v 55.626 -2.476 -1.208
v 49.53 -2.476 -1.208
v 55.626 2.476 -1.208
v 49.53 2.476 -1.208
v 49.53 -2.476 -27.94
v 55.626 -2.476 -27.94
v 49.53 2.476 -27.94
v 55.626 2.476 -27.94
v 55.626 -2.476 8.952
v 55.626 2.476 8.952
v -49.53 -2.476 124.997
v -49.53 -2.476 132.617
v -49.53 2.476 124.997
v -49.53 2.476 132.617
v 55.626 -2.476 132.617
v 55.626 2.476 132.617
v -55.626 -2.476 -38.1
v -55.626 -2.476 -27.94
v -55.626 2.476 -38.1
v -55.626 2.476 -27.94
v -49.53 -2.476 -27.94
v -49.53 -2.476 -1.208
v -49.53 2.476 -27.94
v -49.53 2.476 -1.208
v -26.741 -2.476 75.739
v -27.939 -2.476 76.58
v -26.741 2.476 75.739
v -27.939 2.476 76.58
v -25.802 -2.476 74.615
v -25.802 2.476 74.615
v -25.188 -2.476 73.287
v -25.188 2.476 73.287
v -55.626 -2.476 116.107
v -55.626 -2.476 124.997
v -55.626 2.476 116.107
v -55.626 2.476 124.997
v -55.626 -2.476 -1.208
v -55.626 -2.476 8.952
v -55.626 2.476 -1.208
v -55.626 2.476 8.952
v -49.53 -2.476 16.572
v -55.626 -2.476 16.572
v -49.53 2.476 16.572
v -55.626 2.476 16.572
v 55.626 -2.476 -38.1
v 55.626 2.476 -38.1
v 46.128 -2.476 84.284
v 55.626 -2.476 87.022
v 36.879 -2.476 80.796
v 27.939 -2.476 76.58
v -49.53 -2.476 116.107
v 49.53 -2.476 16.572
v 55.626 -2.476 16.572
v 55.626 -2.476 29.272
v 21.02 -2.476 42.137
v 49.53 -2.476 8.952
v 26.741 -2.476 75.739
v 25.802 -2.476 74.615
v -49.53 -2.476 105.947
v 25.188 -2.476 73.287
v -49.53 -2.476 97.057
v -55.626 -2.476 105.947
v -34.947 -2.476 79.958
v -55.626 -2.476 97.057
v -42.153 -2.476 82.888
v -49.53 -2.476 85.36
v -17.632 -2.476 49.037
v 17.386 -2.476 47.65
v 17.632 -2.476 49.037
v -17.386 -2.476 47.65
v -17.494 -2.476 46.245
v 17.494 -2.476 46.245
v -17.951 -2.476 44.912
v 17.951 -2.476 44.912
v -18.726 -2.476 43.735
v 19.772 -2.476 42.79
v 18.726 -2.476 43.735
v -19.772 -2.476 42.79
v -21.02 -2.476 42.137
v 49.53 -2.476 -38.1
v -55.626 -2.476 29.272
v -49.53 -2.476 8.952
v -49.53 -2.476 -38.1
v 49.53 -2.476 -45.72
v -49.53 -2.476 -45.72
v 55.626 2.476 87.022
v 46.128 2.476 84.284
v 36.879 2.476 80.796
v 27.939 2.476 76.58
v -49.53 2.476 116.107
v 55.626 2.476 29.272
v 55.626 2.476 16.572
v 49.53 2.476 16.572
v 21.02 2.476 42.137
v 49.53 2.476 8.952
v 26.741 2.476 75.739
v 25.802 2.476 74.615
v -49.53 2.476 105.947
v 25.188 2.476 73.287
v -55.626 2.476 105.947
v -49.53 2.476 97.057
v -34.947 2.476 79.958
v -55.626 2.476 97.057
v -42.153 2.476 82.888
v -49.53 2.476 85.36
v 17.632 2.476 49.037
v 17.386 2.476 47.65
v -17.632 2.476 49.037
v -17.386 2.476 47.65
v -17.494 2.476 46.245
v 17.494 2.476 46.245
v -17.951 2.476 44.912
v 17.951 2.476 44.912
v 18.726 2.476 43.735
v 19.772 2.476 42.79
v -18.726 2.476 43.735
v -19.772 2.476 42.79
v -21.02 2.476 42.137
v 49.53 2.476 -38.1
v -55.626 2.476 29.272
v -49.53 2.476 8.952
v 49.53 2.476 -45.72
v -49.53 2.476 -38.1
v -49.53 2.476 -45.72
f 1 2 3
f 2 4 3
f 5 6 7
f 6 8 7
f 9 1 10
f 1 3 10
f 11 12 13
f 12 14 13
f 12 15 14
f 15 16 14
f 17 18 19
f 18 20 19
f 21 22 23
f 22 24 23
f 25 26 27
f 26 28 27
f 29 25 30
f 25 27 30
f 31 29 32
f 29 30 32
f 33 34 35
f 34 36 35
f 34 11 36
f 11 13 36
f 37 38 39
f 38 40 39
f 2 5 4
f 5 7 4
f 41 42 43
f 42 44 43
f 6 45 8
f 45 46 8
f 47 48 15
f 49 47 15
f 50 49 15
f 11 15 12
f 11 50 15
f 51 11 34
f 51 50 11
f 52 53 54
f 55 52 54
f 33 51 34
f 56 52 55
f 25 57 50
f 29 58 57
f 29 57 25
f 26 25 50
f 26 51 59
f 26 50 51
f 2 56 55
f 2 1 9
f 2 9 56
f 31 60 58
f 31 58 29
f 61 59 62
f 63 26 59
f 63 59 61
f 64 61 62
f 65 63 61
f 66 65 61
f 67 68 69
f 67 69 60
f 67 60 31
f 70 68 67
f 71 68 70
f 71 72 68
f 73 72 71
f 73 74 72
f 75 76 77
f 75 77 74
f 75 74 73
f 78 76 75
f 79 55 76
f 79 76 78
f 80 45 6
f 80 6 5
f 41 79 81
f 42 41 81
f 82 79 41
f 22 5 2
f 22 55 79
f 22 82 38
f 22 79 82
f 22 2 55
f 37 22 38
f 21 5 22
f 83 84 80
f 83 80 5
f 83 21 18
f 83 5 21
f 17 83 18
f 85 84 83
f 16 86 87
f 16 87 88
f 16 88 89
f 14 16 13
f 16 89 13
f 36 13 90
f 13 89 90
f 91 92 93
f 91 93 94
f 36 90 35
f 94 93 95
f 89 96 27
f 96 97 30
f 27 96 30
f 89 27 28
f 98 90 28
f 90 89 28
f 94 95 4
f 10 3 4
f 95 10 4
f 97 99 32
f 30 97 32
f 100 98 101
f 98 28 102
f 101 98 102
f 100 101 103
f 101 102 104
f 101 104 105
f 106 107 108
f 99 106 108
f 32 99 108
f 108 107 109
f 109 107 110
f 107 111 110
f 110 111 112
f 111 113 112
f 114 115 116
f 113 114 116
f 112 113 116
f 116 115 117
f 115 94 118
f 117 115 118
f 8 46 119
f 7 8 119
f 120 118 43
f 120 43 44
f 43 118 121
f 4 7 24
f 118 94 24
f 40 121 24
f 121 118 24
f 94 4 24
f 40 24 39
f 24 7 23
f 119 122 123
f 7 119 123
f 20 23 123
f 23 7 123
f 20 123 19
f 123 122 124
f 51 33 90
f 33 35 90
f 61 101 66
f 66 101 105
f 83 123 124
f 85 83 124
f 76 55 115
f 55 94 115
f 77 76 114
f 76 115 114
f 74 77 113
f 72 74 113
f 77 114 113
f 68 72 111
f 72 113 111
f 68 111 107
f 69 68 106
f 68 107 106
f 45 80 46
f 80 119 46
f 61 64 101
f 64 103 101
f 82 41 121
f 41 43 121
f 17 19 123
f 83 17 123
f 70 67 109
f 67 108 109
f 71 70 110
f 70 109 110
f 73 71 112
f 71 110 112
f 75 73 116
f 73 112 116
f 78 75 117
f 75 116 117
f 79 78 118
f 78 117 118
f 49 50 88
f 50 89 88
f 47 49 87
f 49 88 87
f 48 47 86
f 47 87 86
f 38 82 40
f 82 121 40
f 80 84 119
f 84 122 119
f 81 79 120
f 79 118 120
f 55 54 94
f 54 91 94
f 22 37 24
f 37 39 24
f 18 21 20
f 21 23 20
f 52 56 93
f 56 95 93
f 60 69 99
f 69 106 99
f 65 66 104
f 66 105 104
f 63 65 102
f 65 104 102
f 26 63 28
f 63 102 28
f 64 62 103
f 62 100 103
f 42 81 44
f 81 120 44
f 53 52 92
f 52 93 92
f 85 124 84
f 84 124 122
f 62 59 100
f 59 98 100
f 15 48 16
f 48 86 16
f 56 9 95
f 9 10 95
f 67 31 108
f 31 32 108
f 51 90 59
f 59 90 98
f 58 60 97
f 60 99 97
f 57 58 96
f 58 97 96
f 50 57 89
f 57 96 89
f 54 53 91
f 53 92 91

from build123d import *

# Parameters (mm, degrees)
BOSS_EXTRUDE1_DEPTH = 2.4765


with BuildPart() as part:
    # Sketch1 → Boss-Extrude1 (new, symmetric)
    with BuildSketch(Plane(origin=(0, 0, 0), x_dir=(1, 0, 0), z_dir=(0, 1, 0))):
        with BuildLine():
            Line((-49.53, 45.72), (49.53, 45.72))
            Line((49.53, 45.72), (49.53, 38.1))
            Line((49.53, 38.1), (55.626, 38.1))
            Line((55.626, 38.1), (55.626, 27.94))
            Line((55.626, 27.94), (49.53, 27.94))
            Line((49.53, 27.94), (49.53, 1.208143374))
            Line((49.53, 1.208143374), (55.626, 1.208143374))
            Line((55.626, 1.208143374), (55.626, -8.951856626))
            Line((55.626, -8.951856626), (49.53, -8.951856626))
            Line((49.53, -8.951856626), (49.53, -16.571856626))
            Line((49.53, -16.571856626), (55.626, -16.571856626))
            Line((55.626, -16.571856626), (55.626, -29.271856626))
            Line((55.626, -29.271856626), (21.019827136, -42.136821893))
            ThreePointArc((21.019827136, -42.136821893), (17.95098831, -44.911778638), (17.631953735, -49.036869377))
            Line((17.631953735, -49.036869377), (25.187729856, -73.287029113))
            ThreePointArc((25.187729856, -73.287029113), (26.234780075, -75.207903536), (27.939063878, -76.579577488))
            ThreePointArc((27.939063878, -76.579577488), (41.468907088, -82.632484358), (55.626, -87.022365809))
            Line((55.626, -87.022365809), (55.626, -132.617292876))
            Line((55.626, -132.617292876), (-49.53, -132.617292876))
            Line((-49.53, -132.617292876), (-49.53, -124.997292876))
            Line((-49.53, -124.997292876), (-55.626, -124.997292876))
            Line((-55.626, -124.997292876), (-55.626, -116.107292876))
            Line((-55.626, -116.107292876), (-49.53, -116.107292876))
            Line((-49.53, -116.107292876), (-49.53, -105.947292876))
            Line((-49.53, -105.947292876), (-55.626, -105.947292876))
            Line((-55.626, -105.947292876), (-55.626, -97.057292876))
            Line((-55.626, -97.057292876), (-49.53, -97.057292876))
            Line((-49.53, -97.057292876), (-49.53, -85.359826344))
            ThreePointArc((-49.53, -85.359826344), (-38.527111219, -81.479756652), (-27.939063878, -76.579577488))
            ThreePointArc((-27.939063878, -76.579577488), (-26.234780075, -75.207903536), (-25.187729856, -73.287029113))
            Line((-25.187729856, -73.287029113), (-17.631953735, -49.036869377))
            ThreePointArc((-17.631953735, -49.036869377), (-17.95098831, -44.911778638), (-21.019827136, -42.136821893))
            Line((-21.019827136, -42.136821893), (-55.626, -29.271856626))
            Line((-55.626, -29.271856626), (-55.626, -16.571856626))
            Line((-55.626, -16.571856626), (-49.53, -16.571856626))
            Line((-49.53, -16.571856626), (-49.53, -8.951856626))
            Line((-49.53, -8.951856626), (-55.626, -8.951856626))
            Line((-55.626, -8.951856626), (-55.626, 1.208143374))
            Line((-55.626, 1.208143374), (-49.53, 1.208143374))
            Line((-49.53, 1.208143374), (-49.53, 27.94))
            Line((-49.53, 27.94), (-55.626, 27.94))
            Line((-55.626, 27.94), (-55.626, 38.1))
            Line((-55.626, 38.1), (-49.53, 38.1))
            Line((-49.53, 38.1), (-49.53, 45.72))
        make_face()
    extrude(amount=BOSS_EXTRUDE1_DEPTH, both=True)


solid = part.part
